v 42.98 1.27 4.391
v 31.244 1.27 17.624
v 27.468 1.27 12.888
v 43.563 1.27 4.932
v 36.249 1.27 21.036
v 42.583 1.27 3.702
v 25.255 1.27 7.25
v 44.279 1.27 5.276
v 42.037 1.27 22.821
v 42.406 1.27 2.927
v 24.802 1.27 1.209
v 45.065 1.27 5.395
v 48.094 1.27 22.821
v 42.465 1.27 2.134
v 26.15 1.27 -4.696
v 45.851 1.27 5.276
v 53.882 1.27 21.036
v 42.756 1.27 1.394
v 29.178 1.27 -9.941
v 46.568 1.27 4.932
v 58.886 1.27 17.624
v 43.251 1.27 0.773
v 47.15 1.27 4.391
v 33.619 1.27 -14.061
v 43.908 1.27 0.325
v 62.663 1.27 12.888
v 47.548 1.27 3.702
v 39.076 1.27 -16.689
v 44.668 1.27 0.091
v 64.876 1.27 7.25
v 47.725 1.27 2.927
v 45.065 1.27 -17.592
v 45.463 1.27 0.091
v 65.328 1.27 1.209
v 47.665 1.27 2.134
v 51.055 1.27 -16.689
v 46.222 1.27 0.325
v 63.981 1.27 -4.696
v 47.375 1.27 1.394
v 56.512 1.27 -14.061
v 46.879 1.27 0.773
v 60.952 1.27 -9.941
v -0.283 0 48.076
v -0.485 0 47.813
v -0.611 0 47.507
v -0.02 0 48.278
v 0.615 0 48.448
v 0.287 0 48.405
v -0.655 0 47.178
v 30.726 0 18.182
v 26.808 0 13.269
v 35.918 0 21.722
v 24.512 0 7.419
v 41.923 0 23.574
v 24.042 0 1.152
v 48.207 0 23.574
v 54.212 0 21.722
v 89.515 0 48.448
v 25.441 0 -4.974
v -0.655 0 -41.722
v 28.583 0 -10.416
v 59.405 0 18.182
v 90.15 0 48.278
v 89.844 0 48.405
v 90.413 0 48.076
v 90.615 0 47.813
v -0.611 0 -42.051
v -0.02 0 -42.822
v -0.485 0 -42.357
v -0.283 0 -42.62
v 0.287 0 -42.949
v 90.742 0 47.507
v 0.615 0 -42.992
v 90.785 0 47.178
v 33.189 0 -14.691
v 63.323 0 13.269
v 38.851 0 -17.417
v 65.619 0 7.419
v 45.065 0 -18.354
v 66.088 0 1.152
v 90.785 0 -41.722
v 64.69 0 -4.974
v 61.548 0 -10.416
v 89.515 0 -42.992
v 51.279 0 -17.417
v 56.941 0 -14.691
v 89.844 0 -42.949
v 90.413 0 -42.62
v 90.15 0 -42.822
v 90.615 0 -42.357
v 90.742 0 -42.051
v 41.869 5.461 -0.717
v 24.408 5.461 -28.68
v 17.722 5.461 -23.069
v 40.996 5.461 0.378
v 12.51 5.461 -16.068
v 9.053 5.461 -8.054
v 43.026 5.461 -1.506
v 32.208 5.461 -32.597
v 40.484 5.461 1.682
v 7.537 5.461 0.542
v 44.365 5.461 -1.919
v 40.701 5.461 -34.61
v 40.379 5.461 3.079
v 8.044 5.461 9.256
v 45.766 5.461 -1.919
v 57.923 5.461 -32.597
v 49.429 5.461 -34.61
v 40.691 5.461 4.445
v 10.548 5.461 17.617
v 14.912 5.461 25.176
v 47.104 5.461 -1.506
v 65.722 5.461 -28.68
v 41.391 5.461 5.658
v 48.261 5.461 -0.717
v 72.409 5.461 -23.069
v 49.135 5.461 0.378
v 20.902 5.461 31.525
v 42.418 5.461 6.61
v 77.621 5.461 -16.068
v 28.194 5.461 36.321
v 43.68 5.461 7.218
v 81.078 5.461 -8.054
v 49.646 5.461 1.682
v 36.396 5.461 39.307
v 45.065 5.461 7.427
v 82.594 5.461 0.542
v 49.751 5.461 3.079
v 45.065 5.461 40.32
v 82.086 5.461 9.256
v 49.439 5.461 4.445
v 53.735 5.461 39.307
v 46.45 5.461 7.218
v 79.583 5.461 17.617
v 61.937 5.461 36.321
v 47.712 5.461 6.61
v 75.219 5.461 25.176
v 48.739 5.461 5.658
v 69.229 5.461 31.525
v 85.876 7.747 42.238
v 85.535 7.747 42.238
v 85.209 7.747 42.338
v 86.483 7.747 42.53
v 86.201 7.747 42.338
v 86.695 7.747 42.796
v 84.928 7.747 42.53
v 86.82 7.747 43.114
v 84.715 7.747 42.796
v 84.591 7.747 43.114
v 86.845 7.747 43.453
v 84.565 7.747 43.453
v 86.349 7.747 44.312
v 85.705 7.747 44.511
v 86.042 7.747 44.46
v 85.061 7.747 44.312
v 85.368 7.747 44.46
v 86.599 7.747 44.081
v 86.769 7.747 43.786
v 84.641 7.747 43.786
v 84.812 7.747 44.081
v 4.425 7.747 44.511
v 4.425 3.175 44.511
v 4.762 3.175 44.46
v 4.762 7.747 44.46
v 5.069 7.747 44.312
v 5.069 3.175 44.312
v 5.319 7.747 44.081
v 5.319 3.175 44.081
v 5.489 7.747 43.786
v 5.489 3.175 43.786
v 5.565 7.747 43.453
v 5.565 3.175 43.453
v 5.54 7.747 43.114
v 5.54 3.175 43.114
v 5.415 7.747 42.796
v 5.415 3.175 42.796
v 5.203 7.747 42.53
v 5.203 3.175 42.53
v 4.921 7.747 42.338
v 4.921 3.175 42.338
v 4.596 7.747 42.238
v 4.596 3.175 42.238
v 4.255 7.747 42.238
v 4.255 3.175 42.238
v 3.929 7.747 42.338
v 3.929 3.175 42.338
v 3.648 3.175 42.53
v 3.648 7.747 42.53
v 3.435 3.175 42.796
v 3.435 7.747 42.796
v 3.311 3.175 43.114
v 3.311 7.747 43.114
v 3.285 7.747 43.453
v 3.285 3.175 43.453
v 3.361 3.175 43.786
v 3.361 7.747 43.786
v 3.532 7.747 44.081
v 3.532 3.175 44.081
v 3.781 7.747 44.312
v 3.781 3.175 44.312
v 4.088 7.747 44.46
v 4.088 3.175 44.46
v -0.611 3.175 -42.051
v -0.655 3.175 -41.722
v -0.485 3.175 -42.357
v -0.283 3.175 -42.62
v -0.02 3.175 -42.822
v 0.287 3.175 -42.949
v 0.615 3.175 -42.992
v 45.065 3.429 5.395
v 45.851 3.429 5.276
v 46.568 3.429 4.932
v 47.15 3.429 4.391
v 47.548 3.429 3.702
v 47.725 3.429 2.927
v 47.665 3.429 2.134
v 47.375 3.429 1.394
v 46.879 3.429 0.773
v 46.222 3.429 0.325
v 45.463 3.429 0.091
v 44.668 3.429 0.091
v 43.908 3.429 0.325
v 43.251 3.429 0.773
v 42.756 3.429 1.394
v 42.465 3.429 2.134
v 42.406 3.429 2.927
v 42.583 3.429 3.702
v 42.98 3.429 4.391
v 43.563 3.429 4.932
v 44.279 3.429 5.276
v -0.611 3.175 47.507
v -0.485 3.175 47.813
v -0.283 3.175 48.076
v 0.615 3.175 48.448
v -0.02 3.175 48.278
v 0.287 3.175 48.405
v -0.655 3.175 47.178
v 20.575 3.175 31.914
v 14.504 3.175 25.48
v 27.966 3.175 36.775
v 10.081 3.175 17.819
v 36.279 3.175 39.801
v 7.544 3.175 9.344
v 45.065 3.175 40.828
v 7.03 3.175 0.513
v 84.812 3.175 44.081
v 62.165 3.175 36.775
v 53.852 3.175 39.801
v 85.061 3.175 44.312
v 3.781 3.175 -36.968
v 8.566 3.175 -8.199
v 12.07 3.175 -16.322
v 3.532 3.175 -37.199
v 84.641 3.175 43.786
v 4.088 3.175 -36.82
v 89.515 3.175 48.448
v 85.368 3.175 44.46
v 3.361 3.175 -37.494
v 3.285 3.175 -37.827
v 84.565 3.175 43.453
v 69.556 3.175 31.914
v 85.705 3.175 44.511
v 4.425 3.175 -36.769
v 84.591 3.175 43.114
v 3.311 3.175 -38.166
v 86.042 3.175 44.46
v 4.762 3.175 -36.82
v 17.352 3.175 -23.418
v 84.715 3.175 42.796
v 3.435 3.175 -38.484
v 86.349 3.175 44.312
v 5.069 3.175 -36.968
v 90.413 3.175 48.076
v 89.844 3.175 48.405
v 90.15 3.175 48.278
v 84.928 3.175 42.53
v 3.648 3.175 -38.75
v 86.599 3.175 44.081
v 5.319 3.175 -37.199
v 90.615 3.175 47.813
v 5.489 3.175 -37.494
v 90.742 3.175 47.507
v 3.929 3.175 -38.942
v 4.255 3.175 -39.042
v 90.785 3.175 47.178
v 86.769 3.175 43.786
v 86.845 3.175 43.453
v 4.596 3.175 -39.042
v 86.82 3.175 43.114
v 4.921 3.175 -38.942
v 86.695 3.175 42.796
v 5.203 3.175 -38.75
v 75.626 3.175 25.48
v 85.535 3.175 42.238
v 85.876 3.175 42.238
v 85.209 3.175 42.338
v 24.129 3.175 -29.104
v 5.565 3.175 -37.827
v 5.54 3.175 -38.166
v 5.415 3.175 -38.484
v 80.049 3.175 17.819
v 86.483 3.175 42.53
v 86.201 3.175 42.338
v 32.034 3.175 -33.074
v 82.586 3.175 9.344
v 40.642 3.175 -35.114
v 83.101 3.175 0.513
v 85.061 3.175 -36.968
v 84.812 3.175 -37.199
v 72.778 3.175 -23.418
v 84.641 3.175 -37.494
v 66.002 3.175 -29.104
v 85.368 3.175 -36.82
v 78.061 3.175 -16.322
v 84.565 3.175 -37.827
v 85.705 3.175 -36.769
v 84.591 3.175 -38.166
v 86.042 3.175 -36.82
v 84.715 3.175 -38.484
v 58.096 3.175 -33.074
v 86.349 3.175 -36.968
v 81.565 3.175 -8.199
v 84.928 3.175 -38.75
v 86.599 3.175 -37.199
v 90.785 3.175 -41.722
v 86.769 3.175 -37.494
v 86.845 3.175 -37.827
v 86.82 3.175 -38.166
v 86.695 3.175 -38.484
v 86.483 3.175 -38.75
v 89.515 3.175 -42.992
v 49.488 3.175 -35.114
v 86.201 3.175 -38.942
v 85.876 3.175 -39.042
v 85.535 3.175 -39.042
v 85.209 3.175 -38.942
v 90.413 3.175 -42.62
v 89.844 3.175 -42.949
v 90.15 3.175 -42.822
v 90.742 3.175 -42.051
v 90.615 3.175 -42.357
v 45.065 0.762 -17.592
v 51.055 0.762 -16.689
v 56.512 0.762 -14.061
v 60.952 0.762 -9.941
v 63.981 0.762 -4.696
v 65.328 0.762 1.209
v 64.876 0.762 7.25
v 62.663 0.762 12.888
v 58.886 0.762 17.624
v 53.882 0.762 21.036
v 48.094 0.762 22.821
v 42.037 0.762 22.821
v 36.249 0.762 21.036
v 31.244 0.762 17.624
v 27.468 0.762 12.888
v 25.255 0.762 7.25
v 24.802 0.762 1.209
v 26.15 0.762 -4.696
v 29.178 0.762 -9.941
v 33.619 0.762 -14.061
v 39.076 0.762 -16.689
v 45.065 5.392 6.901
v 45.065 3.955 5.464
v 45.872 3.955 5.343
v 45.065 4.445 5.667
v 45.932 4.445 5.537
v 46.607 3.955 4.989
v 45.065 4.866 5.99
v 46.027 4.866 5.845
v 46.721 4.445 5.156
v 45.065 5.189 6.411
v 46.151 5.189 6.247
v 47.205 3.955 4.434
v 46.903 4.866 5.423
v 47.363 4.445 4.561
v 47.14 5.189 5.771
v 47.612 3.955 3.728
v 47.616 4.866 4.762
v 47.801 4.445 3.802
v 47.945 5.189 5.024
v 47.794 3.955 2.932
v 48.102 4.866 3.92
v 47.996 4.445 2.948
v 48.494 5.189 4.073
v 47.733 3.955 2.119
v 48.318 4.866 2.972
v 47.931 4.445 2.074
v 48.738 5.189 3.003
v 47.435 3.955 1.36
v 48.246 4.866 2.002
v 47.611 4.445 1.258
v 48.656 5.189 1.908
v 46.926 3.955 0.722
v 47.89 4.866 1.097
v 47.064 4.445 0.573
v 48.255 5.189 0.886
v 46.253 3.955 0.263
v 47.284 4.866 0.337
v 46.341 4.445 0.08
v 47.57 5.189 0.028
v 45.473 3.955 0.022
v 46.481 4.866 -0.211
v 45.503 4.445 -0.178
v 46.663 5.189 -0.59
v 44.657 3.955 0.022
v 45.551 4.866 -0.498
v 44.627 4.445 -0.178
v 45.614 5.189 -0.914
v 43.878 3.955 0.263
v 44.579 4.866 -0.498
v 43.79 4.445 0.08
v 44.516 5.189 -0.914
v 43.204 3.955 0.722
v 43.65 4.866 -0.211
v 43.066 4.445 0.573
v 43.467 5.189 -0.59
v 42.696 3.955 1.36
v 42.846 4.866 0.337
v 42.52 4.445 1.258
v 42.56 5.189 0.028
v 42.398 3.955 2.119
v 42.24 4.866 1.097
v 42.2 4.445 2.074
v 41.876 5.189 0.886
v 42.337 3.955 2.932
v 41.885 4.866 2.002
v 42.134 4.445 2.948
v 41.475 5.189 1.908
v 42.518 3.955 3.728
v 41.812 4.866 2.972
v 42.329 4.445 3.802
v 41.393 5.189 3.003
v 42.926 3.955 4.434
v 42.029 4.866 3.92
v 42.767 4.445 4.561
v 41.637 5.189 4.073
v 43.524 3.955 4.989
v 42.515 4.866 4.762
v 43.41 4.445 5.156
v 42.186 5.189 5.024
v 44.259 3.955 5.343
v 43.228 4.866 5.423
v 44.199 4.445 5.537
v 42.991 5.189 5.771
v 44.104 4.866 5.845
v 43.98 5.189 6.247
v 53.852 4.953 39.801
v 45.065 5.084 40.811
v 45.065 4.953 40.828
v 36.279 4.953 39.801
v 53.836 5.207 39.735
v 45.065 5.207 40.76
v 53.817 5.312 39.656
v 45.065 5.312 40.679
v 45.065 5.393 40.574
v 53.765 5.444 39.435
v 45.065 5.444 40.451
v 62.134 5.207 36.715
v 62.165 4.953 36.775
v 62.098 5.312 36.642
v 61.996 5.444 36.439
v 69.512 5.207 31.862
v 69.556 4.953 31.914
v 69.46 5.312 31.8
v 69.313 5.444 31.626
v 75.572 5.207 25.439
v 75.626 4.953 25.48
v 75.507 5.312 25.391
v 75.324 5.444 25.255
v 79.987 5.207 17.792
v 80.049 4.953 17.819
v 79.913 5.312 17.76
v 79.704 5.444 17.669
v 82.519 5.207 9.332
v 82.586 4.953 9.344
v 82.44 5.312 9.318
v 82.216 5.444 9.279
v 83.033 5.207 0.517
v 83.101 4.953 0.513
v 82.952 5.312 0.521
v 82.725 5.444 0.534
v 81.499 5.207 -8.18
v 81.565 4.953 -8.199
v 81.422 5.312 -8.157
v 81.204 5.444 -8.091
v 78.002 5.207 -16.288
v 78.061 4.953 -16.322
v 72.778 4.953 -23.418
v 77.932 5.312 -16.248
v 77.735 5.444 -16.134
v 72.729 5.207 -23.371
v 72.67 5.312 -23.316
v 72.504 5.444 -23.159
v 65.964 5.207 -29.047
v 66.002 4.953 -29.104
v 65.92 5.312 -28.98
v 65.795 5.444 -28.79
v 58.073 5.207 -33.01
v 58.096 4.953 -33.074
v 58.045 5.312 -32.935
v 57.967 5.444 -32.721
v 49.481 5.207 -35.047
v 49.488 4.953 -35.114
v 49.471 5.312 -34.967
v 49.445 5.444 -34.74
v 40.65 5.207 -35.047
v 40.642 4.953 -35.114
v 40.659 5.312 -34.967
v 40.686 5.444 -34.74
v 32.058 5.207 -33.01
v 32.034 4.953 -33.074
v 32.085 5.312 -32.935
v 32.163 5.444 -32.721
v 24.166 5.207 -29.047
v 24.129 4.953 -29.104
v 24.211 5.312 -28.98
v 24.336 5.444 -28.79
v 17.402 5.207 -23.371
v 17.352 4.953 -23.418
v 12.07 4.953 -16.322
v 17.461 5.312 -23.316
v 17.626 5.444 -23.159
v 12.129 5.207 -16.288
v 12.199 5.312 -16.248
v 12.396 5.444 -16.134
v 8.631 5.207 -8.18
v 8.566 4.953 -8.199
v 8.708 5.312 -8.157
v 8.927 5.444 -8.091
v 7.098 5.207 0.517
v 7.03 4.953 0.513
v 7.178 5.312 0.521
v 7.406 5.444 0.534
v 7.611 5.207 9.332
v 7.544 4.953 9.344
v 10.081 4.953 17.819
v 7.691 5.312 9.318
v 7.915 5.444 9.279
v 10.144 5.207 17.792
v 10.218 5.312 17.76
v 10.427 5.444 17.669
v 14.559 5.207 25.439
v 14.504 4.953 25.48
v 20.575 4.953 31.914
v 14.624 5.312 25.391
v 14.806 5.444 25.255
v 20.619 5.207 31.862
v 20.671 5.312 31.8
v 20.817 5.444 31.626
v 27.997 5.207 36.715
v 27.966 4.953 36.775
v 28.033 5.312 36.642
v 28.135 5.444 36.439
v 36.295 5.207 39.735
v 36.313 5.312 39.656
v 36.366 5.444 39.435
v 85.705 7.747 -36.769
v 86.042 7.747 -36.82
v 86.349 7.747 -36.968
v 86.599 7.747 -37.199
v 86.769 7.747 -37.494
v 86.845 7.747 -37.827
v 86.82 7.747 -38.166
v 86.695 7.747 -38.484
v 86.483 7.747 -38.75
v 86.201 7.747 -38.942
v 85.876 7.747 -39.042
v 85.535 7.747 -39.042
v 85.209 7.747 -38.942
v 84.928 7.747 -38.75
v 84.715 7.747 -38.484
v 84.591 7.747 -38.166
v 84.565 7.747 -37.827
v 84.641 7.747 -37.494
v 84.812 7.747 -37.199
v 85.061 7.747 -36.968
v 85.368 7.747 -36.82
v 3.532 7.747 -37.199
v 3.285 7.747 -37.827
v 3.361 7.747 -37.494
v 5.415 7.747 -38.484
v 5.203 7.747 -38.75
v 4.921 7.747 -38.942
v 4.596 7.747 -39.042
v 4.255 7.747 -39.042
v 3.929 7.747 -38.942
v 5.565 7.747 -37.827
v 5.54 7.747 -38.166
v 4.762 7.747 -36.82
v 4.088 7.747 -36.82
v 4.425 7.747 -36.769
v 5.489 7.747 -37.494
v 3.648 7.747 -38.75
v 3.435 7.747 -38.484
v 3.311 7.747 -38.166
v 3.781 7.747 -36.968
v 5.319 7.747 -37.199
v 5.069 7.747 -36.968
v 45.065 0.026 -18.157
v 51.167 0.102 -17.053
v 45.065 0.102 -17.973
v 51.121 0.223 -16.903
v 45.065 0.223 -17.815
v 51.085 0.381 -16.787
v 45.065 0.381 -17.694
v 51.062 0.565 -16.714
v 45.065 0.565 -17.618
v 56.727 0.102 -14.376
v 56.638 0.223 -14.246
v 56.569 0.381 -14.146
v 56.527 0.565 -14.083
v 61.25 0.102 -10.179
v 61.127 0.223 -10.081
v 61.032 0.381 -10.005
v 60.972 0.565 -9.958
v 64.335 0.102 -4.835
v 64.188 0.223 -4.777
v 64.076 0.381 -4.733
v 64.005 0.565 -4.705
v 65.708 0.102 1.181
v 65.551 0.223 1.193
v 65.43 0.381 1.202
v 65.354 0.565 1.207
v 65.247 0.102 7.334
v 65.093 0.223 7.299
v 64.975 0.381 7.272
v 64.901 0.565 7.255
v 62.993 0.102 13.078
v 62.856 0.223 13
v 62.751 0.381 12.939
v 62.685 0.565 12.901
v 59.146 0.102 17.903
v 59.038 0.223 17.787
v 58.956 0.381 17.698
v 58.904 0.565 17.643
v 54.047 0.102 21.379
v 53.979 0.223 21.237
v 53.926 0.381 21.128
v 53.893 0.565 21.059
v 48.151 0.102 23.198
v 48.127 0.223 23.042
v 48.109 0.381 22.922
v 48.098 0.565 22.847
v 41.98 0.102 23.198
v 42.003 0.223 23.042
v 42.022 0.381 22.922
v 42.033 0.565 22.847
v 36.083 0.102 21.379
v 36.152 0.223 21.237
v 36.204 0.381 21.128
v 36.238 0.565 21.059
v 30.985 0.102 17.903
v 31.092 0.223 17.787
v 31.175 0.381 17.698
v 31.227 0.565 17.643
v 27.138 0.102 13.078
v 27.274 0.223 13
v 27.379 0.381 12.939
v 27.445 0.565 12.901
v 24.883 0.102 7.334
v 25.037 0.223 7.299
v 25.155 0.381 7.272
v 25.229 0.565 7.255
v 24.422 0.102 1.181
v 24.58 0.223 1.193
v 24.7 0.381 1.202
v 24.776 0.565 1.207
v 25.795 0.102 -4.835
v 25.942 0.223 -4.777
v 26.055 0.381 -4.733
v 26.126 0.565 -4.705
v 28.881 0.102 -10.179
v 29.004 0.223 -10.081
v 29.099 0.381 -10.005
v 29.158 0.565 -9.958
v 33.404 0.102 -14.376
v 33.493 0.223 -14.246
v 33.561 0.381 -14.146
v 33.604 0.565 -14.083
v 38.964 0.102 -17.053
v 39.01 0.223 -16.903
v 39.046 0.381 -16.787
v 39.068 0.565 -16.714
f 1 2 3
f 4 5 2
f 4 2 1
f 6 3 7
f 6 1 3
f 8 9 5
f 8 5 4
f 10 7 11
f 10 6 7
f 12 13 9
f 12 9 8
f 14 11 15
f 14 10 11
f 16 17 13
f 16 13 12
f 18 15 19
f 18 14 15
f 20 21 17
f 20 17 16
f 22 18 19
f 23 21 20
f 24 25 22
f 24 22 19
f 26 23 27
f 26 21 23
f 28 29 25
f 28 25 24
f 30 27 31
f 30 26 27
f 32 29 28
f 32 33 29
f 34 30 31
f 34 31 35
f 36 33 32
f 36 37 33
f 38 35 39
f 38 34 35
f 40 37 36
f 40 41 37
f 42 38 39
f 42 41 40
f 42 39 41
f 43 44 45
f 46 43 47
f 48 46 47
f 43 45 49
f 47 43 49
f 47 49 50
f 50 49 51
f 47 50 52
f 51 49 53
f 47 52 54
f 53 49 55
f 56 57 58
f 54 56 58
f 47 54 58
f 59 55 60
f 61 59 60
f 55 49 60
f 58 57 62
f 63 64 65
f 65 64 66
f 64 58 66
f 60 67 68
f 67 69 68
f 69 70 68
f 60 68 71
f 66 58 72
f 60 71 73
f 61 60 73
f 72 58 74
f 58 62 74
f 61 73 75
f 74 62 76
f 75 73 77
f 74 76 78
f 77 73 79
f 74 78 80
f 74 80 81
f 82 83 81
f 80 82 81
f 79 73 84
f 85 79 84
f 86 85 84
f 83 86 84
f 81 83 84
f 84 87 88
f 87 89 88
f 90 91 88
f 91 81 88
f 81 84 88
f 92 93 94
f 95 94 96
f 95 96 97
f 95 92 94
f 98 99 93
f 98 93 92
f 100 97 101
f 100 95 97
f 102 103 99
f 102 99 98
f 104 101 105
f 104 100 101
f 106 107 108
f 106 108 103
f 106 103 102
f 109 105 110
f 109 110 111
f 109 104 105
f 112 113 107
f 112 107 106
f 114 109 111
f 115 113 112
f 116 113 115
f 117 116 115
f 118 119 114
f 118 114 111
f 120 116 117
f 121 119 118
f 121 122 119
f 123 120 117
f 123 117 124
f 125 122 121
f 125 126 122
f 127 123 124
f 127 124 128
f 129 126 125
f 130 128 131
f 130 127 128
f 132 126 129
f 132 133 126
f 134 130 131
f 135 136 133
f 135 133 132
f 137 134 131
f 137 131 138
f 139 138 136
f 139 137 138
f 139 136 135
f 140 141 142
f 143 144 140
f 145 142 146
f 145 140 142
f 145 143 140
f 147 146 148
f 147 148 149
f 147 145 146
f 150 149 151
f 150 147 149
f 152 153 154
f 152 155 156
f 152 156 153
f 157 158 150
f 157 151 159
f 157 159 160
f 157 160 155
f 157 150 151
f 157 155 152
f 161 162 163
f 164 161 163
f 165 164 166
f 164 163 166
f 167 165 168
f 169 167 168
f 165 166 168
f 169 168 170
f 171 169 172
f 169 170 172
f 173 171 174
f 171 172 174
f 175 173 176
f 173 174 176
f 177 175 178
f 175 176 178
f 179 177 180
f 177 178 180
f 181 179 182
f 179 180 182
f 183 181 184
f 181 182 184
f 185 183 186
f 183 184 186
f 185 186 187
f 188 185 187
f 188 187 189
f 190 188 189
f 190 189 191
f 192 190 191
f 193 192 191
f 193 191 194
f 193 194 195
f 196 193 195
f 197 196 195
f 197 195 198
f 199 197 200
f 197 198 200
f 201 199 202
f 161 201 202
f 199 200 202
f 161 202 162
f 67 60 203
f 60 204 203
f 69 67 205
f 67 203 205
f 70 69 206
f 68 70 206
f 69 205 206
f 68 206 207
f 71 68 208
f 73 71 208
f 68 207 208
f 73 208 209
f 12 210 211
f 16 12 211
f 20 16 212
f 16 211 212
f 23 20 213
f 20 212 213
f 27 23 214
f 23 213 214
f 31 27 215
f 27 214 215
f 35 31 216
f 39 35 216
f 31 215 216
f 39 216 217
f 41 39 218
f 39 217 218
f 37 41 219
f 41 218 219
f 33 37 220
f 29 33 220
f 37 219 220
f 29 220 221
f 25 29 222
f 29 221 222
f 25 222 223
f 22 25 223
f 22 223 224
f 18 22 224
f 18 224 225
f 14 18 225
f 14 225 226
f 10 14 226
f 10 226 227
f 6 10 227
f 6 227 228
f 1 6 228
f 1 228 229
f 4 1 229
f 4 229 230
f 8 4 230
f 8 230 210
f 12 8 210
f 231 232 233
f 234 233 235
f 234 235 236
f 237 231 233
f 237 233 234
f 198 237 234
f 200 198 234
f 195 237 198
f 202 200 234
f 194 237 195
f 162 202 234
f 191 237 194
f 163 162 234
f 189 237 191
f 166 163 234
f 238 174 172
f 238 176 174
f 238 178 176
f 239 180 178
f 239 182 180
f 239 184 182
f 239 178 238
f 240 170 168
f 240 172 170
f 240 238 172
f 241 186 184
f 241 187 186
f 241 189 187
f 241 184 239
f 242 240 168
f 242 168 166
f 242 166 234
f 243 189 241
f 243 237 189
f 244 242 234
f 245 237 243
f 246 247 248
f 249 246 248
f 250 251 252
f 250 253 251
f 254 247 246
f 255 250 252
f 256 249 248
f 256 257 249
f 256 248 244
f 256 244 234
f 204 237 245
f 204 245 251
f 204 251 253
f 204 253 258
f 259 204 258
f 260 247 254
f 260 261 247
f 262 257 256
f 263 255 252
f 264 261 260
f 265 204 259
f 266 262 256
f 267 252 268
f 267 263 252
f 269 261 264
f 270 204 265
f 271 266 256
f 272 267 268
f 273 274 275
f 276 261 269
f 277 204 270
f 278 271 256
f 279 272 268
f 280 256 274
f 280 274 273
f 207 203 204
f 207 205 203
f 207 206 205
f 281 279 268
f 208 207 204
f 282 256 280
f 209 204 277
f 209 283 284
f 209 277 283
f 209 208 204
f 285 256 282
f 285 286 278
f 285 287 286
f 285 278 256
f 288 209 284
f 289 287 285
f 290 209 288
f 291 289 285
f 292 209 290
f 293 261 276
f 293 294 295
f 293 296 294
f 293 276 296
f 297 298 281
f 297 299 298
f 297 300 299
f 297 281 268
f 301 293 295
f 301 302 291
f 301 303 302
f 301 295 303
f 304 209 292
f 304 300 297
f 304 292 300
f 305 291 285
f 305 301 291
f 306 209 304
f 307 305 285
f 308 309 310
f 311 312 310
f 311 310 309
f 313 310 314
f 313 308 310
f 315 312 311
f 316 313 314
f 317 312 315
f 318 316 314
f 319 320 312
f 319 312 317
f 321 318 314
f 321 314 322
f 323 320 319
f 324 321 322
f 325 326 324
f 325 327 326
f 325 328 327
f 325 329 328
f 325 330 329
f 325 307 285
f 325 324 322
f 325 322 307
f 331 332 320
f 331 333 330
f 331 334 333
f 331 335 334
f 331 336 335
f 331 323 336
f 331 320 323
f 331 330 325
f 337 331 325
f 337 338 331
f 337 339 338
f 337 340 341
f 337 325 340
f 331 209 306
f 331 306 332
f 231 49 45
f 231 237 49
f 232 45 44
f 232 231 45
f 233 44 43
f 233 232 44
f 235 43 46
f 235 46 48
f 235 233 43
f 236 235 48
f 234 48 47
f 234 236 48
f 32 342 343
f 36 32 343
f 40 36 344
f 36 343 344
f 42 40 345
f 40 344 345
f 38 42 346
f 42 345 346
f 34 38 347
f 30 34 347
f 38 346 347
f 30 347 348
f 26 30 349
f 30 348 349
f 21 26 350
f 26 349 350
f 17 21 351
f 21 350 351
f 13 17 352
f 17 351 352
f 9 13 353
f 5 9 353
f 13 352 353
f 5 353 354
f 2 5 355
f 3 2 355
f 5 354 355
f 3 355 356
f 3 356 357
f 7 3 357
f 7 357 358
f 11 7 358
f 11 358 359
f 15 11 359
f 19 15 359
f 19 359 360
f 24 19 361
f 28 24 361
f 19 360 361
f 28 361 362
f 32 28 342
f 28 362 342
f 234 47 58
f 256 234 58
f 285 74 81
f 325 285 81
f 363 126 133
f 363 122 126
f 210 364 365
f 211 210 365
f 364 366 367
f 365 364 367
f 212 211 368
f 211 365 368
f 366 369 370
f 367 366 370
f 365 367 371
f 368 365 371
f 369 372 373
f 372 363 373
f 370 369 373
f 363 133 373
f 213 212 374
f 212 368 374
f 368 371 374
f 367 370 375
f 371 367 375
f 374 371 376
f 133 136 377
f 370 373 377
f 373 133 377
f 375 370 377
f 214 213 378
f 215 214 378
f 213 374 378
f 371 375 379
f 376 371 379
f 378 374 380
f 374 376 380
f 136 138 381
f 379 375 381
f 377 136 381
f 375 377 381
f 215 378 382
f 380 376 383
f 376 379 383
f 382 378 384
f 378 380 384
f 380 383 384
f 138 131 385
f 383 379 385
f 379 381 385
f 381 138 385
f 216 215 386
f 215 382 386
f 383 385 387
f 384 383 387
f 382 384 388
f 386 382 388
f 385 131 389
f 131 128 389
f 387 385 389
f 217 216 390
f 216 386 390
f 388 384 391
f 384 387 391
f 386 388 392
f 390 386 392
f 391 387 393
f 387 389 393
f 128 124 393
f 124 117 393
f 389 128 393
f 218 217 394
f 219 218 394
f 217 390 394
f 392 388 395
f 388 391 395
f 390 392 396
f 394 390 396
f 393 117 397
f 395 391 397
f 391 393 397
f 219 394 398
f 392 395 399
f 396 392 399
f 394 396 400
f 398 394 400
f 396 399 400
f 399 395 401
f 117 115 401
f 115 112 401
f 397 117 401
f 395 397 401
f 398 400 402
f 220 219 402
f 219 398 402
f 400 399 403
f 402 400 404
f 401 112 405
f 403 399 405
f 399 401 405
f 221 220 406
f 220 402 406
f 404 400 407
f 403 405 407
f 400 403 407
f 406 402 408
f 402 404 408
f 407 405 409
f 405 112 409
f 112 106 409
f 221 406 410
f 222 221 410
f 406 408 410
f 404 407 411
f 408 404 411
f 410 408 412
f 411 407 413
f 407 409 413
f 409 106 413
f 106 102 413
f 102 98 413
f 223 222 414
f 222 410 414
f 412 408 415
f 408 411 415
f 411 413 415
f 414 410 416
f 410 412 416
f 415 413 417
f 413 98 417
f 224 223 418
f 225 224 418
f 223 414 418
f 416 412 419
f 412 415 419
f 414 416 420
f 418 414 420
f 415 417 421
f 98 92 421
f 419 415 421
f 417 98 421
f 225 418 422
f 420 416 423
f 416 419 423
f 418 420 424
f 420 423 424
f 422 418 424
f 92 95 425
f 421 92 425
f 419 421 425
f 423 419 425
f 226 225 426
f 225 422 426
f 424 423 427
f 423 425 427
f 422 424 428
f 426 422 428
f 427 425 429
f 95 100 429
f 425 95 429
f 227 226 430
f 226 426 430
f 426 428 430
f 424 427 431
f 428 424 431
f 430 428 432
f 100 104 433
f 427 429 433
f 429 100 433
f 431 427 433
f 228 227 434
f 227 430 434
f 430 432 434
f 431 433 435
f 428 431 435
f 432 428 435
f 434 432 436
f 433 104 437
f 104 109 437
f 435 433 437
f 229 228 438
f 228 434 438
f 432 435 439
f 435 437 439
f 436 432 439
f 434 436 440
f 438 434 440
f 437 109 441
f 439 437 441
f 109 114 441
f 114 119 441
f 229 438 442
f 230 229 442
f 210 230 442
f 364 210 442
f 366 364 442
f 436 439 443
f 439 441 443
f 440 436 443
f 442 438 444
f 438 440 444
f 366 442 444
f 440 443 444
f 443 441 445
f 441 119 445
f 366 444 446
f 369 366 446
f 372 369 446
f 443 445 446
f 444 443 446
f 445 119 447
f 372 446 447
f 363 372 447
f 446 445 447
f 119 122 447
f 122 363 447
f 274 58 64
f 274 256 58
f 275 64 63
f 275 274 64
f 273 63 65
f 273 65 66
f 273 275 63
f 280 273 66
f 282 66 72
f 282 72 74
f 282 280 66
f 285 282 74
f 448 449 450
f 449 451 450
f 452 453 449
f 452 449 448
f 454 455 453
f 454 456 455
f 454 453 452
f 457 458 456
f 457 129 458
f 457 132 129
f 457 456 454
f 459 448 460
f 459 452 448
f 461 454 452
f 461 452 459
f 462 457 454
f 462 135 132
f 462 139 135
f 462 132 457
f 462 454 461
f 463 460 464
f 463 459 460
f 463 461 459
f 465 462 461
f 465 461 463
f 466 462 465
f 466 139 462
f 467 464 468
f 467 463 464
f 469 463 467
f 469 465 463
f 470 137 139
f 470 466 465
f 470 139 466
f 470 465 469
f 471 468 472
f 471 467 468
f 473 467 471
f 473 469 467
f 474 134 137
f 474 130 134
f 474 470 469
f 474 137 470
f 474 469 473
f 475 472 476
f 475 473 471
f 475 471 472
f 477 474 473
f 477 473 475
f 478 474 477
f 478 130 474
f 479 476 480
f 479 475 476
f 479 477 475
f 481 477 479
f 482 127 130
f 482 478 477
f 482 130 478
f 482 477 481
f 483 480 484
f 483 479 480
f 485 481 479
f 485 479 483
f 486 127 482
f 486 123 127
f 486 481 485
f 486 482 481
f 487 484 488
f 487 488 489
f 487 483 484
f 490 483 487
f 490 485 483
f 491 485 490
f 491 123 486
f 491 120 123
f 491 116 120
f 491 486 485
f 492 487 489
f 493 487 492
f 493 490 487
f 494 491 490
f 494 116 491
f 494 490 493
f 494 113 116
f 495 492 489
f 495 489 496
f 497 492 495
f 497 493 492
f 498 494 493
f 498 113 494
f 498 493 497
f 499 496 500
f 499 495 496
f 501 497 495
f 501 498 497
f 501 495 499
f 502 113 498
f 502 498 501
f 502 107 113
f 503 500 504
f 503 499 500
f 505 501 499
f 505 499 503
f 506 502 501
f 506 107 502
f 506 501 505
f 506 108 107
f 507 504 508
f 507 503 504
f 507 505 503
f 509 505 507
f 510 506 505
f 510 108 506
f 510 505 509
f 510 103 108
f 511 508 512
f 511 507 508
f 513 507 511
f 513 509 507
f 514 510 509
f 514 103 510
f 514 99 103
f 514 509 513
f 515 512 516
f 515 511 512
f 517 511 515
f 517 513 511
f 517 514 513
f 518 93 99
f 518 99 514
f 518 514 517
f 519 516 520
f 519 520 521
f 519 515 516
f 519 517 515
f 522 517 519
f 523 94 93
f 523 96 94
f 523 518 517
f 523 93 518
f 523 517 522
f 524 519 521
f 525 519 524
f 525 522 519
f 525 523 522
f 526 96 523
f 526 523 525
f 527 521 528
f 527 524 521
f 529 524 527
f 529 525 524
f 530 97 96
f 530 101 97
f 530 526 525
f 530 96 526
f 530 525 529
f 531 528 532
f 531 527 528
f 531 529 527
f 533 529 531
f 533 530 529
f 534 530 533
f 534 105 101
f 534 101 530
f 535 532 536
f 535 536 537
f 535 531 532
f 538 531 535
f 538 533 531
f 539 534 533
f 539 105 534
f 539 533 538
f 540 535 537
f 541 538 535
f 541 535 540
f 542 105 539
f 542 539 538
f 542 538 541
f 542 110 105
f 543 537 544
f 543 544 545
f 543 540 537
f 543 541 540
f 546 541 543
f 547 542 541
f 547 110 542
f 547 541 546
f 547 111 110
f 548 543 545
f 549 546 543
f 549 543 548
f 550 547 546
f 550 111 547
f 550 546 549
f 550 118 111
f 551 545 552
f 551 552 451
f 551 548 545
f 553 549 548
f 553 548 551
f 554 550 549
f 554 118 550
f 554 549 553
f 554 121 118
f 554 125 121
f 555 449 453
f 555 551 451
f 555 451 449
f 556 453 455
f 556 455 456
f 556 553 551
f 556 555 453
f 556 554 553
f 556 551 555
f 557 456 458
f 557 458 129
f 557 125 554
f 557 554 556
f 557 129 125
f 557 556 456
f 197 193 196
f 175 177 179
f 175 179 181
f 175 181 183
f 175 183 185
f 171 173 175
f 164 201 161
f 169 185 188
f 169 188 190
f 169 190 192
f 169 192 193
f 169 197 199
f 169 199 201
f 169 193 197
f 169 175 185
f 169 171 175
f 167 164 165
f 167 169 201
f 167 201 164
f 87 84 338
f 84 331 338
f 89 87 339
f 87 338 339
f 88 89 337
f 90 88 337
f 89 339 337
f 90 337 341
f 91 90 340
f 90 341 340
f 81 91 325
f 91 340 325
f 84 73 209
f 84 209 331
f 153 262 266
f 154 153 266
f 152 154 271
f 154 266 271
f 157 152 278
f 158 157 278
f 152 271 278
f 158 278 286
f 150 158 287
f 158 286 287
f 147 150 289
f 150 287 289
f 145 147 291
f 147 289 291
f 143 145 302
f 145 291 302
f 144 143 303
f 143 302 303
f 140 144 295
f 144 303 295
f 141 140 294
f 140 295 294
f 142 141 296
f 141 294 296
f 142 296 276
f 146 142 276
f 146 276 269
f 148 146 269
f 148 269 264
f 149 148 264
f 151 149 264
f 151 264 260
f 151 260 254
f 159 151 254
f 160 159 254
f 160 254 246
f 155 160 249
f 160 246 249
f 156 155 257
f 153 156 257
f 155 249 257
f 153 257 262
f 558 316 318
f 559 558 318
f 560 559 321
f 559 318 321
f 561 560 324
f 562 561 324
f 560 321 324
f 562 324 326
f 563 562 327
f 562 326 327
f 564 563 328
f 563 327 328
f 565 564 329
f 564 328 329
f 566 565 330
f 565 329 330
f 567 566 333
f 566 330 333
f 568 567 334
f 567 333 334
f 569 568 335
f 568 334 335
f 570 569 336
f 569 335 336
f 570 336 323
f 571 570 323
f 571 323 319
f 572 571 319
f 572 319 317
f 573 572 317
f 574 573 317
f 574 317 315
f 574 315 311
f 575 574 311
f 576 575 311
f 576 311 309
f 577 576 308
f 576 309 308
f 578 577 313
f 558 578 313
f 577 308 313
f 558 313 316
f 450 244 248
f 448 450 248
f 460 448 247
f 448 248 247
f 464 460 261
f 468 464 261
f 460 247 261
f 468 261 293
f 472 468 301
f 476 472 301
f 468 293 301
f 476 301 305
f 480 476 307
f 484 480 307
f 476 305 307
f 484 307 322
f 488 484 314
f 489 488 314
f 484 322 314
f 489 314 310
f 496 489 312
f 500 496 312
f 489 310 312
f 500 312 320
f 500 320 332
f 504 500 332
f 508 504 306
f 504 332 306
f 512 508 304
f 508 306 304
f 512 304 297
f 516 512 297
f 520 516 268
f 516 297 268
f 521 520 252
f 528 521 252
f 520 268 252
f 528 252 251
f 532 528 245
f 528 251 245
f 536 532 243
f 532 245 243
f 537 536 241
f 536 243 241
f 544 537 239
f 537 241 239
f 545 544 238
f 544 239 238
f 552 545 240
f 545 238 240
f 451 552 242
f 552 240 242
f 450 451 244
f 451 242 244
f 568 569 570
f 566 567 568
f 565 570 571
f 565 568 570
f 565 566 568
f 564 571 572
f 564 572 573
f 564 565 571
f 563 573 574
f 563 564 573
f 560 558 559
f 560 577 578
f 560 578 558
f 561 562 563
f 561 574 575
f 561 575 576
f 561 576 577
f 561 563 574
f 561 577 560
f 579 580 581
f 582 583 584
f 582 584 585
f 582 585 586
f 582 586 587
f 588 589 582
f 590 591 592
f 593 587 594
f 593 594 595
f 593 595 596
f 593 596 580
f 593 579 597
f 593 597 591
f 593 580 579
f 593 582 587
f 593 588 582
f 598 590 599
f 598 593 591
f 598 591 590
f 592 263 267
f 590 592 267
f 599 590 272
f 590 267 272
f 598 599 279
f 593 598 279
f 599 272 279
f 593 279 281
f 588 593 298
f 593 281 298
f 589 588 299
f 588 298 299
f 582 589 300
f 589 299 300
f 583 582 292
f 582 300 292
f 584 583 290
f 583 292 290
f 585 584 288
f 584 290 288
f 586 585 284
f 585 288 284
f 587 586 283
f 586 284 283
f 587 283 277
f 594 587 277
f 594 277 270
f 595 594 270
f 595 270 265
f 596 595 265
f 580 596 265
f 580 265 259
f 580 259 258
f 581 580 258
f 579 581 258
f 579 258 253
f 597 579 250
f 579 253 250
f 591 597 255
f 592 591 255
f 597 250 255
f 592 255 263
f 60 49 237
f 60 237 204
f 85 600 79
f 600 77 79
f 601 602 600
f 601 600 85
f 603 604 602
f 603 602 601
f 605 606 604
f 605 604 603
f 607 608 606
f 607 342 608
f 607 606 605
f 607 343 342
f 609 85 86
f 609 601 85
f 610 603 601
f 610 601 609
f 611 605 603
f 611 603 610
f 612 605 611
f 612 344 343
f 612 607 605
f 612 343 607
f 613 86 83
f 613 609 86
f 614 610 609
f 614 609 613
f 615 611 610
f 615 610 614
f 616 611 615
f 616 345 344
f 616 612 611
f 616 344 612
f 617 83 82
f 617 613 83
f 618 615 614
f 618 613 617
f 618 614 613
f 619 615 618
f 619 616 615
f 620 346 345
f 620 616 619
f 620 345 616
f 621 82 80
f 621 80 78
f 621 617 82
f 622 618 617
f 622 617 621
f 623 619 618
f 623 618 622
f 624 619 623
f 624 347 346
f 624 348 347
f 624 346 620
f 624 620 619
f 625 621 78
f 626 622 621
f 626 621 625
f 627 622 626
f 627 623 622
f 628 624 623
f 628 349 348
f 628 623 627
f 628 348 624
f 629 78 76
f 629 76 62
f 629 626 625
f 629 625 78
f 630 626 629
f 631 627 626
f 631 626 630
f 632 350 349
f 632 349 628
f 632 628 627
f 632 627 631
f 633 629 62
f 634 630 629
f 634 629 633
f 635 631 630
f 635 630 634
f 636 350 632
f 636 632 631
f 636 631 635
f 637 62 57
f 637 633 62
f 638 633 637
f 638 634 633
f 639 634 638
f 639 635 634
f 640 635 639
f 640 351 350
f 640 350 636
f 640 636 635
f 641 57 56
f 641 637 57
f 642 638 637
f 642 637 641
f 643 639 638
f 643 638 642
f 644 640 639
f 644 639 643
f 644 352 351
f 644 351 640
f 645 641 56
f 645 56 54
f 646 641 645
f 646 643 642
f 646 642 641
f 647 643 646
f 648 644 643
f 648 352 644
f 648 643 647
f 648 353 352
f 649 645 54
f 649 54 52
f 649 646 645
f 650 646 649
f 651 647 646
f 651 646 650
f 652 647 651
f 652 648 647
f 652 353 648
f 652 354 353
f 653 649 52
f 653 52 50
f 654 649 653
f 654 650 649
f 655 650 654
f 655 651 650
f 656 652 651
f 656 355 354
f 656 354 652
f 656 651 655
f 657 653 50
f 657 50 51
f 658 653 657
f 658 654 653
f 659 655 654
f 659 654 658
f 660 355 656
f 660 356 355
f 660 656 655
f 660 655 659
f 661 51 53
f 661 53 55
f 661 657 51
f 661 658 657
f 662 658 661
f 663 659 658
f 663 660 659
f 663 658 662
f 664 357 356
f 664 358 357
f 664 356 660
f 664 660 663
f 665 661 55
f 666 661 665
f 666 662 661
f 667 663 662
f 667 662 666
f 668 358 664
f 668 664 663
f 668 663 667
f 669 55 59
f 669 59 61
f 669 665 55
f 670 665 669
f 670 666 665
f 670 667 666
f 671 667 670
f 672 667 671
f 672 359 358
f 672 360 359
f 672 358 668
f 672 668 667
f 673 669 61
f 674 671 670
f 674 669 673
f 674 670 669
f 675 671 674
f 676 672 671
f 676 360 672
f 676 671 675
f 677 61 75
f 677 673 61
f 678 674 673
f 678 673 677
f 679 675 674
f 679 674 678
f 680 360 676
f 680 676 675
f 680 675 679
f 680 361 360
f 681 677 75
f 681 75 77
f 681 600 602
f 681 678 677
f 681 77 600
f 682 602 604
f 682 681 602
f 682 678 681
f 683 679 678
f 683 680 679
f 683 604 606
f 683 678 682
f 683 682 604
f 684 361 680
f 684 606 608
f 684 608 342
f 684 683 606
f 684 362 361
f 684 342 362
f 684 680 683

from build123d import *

# Parameters (mm, degrees)
SKETCH1_W           = 91.44
SKETCH1_H           = 91.44
BOSS_EXTRUDE1_DEPTH = 3.175
SKETCH2_R           = 38.1
BOSS_EXTRUDE2_DEPTH = 2.286
SKETCH3_R           = 1.143
BOSS_EXTRUDE3_DEPTH = 4.572
SKETCH4_R           = 2.667
CUT_EXTRUDE1_DEPTH  = 104.048504199
FILLET1_R           = 2.032
FILLET3_R           = 1.27
SKETCH5_R           = 20.32
CUT_EXTRUDE2_DEPTH  = 1.27
FILLET4_R           = 0.762
FILLET6_R           = 0.508


with BuildPart() as part:
    # Sketch1 → Boss-Extrude1 (new body)
    with BuildSketch(Plane(origin=(0, 0, 0), x_dir=(1, 0, 0), z_dir=(0, 1, 0))):
        with Locations((45.065298329, -2.727923628)):
            Rectangle(SKETCH1_W, SKETCH1_H)
    extrude(amount=BOSS_EXTRUDE1_DEPTH)

    # Sketch2 → Boss-Extrude2 (add)
    with BuildSketch(Plane(origin=(0, 3.175, 0), x_dir=(1, 0, 0), z_dir=(0, 1, 0))):
        with Locations(Location((45.065298329, -2.727923628, 0), (0, 0, 270))):
            Circle(SKETCH2_R)
    extrude(amount=BOSS_EXTRUDE2_DEPTH)

    # Sketch3 → Boss-Extrude3 (add)
    with BuildSketch(Plane(origin=(0, 3.175, 0), x_dir=(1, 0, 0), z_dir=(0, 1, 0))):
        with Locations(Location((4.425298329, 37.912076372, 0), (0, 0, 270))):
            Circle(SKETCH3_R)
        with Locations(Location((4.425298329, -43.367923628, 0), (0, 0, 270))):
            Circle(SKETCH3_R)
        with Locations(Location((85.705298329, -43.367923628, 0), (0, 0, 270))):
            Circle(SKETCH3_R)
        with Locations(Location((85.705298329, 37.912076372, 0), (0, 0, 270))):
            Circle(SKETCH3_R)
    extrude(amount=BOSS_EXTRUDE3_DEPTH)

    # Sketch4 → Cut-Extrude1 (cut, through all)
    with BuildSketch(Plane(origin=(0, 5.461, 0), x_dir=(1, 0, 0), z_dir=(0, 1, 0))):
        with Locations(Location((45.065298329, -2.727923628, 0), (0, 0, 270))):
            Circle(SKETCH4_R)
    extrude(amount=-CUT_EXTRUDE1_DEPTH, mode=Mode.SUBTRACT)

    # Fillet1
    fillet1_edges = [part.edges().sort_by_distance(p)[0] for p in [
        (45.065298329, 5.461, 0.060923628),
    ]]
    fillet(fillet1_edges, radius=FILLET1_R)

    # Fillet3
    fillet3_edges = [part.edges().sort_by_distance(p)[0] for p in [
        (-0.654701671, 1.5875, -42.992076372),
        (90.785298329, 1.5875, -42.992076372),
        (90.785298329, 1.5875, 48.447923628),
        (-0.654701671, 1.5875, 48.447923628),
    ]]
    fillet(fillet3_edges, radius=FILLET3_R)

    # Sketch5 → Cut-Extrude2 (cut)
    with BuildSketch(Plane.XZ):
        with Locations(Location((45.065298329, 2.727923628, 0), (0, 0, 270))):
            Circle(SKETCH5_R)
    extrude(amount=-CUT_EXTRUDE2_DEPTH, mode=Mode.SUBTRACT)

    # Fillet4
    fillet4_edges = [part.edges().sort_by_distance(p)[0] for p in [
        (45.065298329, 0, 23.047923628),
    ]]
    fillet(fillet4_edges, radius=FILLET4_R)

    # Fillet6
    fillet6_edges = [part.edges().sort_by_distance(p)[0] for p in [
        (45.065298329, 5.461, -35.372076372),
    ]]
    fillet(fillet6_edges, radius=FILLET6_R)


solid = part.part
